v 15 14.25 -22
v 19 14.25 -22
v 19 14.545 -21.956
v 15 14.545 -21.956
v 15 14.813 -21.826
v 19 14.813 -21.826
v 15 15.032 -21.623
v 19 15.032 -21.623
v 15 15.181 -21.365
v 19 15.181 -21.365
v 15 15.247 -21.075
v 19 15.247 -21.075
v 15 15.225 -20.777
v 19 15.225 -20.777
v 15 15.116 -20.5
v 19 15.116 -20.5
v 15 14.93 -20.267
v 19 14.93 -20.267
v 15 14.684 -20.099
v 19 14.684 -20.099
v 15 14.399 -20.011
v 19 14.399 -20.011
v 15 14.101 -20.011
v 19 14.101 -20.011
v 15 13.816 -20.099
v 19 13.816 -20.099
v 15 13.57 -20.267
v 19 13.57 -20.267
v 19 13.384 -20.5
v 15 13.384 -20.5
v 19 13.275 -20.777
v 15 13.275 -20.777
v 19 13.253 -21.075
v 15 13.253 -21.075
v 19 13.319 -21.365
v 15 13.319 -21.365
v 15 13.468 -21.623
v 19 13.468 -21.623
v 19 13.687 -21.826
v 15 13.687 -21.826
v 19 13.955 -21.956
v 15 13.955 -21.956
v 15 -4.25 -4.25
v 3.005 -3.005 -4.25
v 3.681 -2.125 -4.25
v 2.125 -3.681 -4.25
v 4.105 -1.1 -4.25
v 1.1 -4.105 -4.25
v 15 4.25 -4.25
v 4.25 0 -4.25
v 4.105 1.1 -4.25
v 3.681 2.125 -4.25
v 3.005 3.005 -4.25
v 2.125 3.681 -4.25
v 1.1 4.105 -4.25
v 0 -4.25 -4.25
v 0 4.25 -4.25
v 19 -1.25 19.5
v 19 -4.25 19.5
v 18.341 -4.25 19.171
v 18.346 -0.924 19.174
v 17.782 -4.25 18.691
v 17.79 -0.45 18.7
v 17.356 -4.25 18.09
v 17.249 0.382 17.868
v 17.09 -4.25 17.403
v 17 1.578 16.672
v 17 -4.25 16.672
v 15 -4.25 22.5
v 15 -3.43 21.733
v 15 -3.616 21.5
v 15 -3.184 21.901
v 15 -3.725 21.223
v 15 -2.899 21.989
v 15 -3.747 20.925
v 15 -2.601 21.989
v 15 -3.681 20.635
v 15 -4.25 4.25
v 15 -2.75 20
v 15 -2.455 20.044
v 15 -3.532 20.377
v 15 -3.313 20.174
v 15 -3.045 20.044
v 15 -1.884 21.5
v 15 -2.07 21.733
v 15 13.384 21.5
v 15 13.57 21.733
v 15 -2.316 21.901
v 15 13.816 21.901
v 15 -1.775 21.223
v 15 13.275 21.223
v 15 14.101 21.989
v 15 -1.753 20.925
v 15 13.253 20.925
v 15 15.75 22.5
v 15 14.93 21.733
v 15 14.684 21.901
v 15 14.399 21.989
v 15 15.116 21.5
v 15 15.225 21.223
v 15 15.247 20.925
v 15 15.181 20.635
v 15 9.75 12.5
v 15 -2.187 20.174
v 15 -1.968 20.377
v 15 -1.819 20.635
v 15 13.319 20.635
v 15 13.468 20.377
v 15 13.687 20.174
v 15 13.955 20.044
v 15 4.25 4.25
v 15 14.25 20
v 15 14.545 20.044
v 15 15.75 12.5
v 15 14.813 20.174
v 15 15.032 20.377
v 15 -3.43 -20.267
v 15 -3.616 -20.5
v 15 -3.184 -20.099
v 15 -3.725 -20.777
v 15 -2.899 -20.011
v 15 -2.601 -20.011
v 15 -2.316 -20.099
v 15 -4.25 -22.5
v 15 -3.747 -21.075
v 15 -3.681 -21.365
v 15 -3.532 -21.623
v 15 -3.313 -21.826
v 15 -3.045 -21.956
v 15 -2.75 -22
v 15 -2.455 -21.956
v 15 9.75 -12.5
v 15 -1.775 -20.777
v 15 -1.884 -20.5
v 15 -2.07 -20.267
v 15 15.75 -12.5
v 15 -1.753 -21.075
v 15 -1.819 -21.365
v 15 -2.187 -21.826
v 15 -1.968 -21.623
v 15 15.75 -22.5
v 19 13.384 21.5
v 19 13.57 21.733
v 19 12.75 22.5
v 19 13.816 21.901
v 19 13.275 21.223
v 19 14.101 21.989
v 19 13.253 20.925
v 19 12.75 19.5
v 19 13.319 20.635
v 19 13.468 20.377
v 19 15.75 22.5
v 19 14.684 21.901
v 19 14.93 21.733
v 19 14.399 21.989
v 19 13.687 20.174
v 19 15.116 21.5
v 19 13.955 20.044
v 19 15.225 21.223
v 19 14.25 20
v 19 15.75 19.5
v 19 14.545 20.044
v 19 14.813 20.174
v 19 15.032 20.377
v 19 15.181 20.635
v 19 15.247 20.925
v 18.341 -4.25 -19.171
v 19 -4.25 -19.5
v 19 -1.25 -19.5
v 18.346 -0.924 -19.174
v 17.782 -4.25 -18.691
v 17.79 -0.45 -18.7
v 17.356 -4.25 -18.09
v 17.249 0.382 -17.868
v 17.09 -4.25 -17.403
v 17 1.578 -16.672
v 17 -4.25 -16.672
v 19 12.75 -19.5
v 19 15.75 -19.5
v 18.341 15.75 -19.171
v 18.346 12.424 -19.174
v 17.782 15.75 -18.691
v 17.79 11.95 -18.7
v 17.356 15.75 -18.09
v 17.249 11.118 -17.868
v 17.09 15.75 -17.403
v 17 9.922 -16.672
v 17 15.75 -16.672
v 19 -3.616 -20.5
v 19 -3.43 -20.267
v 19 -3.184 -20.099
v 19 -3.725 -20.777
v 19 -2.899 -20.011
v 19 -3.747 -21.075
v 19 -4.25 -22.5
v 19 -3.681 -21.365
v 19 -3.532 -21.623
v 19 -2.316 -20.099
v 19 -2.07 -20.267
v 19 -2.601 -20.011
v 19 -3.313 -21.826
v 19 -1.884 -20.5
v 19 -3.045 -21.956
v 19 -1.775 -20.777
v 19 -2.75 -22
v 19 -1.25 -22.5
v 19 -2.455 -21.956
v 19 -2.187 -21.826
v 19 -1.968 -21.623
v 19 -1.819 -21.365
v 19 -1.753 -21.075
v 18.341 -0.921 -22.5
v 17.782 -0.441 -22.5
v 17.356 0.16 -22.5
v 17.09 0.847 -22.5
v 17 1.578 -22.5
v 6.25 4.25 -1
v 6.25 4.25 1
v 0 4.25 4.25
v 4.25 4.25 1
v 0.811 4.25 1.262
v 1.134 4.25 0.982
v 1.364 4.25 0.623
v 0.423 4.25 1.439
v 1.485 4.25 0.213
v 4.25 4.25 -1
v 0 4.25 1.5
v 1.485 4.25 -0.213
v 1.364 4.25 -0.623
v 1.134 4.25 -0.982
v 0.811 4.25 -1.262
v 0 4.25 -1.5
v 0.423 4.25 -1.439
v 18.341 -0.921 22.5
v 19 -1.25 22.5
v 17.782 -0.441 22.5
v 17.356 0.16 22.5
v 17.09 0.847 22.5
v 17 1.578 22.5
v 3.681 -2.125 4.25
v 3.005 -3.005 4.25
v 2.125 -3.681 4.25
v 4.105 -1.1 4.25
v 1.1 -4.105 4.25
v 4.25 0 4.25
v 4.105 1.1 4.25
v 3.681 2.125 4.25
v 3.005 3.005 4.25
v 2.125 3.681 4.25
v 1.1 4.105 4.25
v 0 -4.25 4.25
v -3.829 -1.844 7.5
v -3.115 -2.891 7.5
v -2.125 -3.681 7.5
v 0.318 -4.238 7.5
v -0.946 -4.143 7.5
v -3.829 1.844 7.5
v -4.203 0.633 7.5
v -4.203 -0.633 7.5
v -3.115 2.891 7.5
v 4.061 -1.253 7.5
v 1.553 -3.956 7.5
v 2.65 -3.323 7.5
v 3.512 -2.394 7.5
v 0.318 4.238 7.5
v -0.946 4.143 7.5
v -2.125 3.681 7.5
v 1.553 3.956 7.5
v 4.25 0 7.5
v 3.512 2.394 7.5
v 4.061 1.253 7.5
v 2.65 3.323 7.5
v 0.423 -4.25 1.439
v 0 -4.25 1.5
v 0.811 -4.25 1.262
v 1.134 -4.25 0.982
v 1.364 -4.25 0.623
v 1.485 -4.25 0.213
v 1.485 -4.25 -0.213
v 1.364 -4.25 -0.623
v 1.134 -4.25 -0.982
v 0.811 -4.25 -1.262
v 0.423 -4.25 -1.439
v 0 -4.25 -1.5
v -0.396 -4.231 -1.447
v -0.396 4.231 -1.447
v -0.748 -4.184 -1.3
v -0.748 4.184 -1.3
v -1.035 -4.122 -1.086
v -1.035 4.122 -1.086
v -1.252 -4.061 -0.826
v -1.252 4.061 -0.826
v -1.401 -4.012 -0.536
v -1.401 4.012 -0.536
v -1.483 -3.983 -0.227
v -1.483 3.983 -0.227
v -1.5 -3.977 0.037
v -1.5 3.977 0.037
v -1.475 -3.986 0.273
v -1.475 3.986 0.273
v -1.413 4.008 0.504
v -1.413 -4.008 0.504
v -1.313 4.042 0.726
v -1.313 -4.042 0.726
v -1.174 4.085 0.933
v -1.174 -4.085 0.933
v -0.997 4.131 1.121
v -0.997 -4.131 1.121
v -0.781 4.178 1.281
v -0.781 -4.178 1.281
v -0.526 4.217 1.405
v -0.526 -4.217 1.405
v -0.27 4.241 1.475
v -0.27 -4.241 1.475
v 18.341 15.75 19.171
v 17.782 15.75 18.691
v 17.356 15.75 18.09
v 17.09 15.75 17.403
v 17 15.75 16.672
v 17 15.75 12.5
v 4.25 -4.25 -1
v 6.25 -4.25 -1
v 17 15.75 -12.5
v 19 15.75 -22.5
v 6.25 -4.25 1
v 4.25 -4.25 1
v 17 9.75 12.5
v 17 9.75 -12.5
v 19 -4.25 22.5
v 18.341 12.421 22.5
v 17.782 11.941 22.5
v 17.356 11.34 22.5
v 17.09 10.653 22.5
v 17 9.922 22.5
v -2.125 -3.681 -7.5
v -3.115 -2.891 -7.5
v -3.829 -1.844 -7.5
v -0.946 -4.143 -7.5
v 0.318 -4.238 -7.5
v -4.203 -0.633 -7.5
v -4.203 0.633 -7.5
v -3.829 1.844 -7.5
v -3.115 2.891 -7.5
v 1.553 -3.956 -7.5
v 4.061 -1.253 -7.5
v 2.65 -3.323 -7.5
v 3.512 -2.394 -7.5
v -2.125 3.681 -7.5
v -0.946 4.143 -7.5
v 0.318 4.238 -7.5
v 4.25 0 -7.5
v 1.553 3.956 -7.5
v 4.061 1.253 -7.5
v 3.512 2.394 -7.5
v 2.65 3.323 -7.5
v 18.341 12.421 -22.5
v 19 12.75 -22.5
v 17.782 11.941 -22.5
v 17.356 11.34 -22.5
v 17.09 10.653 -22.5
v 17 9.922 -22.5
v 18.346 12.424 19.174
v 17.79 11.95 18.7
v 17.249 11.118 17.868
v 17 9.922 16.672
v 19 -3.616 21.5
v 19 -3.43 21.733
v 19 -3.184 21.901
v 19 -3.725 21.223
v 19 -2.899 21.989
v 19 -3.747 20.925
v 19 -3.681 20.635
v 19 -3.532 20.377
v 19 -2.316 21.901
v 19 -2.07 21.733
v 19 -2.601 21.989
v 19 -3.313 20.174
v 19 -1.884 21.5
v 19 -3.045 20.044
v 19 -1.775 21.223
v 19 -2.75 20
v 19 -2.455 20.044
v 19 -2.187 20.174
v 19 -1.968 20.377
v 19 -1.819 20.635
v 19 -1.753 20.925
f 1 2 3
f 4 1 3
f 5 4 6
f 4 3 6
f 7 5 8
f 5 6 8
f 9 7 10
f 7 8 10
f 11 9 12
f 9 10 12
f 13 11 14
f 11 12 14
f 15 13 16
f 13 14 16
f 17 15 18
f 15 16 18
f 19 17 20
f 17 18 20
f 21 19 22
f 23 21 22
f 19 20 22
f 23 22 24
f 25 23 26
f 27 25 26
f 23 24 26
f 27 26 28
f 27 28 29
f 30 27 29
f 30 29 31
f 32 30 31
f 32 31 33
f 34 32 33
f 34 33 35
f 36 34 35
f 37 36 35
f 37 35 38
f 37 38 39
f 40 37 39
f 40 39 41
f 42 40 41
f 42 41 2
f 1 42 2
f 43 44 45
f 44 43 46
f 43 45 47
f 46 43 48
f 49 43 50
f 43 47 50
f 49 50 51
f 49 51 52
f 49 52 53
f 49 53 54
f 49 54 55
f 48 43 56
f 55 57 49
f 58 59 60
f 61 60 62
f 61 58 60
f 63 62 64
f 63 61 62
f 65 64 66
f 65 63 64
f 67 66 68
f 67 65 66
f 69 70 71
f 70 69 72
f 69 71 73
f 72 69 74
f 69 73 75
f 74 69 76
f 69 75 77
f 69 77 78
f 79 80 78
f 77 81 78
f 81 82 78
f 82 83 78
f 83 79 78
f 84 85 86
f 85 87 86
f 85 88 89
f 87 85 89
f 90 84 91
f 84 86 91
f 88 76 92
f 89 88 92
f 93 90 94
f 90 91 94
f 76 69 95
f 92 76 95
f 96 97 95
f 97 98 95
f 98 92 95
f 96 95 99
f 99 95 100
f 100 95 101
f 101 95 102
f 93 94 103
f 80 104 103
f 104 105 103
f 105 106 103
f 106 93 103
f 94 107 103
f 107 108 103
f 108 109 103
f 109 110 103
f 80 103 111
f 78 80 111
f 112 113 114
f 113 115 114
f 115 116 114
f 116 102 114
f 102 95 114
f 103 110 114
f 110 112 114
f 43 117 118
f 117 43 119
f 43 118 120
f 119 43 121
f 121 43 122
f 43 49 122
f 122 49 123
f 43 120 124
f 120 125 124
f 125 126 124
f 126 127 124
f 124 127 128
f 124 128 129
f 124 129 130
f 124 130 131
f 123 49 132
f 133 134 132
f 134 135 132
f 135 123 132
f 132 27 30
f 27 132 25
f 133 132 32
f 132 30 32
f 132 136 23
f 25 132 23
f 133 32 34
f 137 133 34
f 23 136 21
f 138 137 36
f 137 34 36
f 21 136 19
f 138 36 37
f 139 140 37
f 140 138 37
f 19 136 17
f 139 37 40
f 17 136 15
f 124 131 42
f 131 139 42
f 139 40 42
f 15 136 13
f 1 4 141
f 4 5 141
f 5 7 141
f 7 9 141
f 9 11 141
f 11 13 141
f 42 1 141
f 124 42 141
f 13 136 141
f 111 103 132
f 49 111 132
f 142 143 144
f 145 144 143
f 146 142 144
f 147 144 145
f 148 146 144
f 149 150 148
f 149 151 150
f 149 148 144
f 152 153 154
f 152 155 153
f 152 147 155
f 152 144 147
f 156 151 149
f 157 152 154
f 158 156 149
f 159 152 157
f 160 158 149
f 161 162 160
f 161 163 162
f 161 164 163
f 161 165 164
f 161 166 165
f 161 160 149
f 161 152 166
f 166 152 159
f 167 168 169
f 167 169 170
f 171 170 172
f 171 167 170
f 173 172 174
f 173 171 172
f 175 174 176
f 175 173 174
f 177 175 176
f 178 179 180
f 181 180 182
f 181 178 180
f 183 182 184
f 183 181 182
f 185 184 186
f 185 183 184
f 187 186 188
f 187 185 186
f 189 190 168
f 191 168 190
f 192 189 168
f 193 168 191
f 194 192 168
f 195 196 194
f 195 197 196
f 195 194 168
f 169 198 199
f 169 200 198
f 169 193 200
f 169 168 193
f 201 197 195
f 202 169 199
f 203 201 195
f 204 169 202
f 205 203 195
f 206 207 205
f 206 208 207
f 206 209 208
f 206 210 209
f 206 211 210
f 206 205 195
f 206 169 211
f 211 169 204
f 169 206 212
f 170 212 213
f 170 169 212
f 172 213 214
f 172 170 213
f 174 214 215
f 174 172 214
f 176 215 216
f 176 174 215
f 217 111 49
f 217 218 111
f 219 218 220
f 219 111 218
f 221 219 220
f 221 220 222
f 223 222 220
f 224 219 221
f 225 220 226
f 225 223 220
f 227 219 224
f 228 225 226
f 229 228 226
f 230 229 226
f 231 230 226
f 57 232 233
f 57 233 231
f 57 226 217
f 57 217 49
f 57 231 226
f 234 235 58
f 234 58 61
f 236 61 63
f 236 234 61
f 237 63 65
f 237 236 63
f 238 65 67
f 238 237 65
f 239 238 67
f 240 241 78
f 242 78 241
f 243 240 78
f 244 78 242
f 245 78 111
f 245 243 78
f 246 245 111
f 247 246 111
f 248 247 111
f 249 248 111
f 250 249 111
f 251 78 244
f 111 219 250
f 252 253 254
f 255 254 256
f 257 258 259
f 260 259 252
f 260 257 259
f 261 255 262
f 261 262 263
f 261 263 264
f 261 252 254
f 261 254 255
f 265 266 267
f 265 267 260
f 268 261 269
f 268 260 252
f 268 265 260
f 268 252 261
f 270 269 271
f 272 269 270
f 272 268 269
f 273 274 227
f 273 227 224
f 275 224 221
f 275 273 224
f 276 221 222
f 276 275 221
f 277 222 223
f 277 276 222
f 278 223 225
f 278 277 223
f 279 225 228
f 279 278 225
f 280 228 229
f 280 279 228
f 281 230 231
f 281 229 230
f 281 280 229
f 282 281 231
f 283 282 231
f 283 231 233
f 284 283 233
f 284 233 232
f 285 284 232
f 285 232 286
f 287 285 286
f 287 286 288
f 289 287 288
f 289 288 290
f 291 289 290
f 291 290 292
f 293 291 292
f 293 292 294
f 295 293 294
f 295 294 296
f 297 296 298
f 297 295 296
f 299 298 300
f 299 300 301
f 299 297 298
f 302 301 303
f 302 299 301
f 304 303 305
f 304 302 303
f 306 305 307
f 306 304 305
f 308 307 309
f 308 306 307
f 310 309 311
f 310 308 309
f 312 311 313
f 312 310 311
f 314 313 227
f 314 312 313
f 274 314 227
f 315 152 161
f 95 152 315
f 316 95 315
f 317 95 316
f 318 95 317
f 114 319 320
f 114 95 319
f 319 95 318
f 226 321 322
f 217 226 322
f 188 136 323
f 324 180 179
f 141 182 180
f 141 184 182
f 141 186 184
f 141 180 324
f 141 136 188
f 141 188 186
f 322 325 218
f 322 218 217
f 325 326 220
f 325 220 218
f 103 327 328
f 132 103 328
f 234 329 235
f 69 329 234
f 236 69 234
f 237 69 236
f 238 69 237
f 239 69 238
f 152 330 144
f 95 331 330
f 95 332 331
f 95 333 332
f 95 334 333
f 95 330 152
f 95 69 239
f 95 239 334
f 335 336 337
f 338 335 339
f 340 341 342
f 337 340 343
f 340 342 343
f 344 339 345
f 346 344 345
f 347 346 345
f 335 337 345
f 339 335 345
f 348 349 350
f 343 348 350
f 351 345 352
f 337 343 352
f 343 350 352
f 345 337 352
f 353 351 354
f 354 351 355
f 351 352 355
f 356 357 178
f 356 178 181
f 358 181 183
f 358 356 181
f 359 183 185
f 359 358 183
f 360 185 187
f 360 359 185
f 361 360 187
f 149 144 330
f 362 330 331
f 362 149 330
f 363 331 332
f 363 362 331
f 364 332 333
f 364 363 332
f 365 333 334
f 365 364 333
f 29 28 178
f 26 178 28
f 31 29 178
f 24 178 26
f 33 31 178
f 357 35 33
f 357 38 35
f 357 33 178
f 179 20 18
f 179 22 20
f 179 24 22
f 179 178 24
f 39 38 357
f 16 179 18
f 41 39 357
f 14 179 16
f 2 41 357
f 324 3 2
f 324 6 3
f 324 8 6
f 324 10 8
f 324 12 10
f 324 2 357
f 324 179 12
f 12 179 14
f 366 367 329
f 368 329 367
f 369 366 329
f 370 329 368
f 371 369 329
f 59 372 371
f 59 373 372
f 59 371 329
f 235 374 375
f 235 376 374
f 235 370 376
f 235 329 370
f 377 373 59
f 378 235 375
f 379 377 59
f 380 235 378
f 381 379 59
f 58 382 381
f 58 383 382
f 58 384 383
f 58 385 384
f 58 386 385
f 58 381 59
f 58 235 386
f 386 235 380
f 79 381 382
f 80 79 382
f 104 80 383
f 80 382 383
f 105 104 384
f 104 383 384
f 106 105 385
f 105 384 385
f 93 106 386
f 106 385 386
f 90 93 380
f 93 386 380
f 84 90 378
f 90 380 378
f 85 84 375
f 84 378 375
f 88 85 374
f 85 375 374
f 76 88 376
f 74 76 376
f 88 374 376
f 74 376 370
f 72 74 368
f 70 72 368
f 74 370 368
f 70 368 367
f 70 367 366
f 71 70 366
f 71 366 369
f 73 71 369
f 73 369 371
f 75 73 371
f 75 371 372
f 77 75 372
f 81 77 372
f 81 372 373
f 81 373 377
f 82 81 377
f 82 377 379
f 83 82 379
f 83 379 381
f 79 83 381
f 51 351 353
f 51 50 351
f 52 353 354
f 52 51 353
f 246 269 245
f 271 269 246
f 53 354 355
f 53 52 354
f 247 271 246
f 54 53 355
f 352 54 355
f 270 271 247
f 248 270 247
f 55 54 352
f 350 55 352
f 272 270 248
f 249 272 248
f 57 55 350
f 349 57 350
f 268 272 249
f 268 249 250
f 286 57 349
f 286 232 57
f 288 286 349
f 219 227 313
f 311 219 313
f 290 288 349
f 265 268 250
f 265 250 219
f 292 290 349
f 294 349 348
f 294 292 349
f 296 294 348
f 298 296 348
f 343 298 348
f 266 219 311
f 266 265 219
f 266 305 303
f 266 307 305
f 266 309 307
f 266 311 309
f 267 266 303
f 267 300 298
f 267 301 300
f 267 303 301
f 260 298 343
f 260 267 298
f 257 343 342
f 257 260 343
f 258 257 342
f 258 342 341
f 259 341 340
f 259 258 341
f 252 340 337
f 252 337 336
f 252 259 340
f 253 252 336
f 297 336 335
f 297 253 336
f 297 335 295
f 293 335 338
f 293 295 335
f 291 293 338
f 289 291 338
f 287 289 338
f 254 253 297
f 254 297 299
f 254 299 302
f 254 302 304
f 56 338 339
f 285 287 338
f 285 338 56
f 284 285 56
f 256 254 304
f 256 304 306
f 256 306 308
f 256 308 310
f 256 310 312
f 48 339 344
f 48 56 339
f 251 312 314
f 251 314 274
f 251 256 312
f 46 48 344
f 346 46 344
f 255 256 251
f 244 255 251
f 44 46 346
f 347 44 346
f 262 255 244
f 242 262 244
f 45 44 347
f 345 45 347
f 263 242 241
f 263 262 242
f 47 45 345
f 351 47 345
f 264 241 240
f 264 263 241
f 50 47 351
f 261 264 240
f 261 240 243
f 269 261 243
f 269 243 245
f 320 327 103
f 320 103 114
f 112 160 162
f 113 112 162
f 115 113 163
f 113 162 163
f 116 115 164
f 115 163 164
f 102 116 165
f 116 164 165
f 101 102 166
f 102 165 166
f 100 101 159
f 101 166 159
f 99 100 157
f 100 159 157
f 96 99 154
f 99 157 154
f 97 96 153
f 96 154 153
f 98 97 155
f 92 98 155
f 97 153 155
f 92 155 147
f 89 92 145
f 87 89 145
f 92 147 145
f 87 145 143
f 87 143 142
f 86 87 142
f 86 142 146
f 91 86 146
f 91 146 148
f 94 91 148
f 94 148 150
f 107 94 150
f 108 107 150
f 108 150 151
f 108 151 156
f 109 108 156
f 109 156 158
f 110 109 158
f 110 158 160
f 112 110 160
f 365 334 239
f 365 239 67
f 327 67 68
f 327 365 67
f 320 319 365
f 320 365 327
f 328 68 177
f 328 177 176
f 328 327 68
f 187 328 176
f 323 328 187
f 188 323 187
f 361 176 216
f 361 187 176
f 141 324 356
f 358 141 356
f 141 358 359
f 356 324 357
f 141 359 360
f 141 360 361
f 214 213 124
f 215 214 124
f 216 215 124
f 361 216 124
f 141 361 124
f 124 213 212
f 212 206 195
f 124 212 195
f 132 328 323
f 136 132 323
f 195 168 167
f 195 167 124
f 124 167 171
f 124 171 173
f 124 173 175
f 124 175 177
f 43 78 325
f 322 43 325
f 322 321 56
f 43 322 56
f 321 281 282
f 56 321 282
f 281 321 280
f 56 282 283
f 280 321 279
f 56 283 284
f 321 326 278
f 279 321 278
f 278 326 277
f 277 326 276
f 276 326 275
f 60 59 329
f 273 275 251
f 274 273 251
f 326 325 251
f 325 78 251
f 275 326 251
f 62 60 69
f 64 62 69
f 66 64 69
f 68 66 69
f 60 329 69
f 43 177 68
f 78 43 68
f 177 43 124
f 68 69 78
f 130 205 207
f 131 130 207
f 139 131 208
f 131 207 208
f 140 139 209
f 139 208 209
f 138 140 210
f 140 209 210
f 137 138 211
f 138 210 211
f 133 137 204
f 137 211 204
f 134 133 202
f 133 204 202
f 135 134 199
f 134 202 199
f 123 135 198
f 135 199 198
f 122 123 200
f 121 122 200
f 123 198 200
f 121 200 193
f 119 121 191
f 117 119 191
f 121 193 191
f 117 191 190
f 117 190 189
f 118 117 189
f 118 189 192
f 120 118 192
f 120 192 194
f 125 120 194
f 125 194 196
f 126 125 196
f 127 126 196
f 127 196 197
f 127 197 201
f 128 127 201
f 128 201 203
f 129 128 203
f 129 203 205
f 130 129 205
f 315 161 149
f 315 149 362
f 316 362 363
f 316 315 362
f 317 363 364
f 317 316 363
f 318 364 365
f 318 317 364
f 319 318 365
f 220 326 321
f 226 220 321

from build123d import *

# Parameters (mm, degrees)
SKETCH1_R               = 4.25
BOSS_EXTRUDE1_DEPTH     = 7.5
SKETCH2_W               = 8.5
SKETCH2_H               = 8.5
BOSS_EXTRUDE2_DEPTH     = 15
SKETCH3_W               = 45
SKETCH3_H               = 20
BOSS_EXTRUDE3_DEPTH     = 4
SKETCH4_R               = 1
CUT_EXTRUDE1_DEPTH      = 36.984371608
CUT_EXTRUDE2_DEPTH      = 2
SKETCH6_W               = 25
SKETCH6_H               = 6
CUT_EXTRUDE3_DEPTH      = 2
CUT_EXTRUDE4_DEPTH      = 32.614869919
CUT_EXTRUDE4_DEPTH_BACK = 32.614869919
SKETCH7_R               = 1.5
CUT_EXTRUDE5_DEPTH      = 34.396294705
CUT_EXTRUDE5_DEPTH_BACK = 34.396294705
SKETCH8_W               = 2
SKETCH8_H               = 2
FILLET1_R               = 3


with BuildPart() as part:
    # Sketch1 → Boss-Extrude1 (new, symmetric)
    with BuildSketch(Plane.XY):
        Circle(SKETCH1_R)
    extrude(amount=BOSS_EXTRUDE1_DEPTH, both=True)

    # Sketch2 → Boss-Extrude2 (add)
    with BuildSketch(Plane(origin=(0, 0, 0), x_dir=(0, 0, -1), z_dir=(1, 0, 0))):
        Rectangle(SKETCH2_W, SKETCH2_H)
    extrude(amount=BOSS_EXTRUDE2_DEPTH)

    # Sketch3 → Boss-Extrude3 (add)
    with BuildSketch(Plane(origin=(15, 0, 0), x_dir=(0, 0, -1), z_dir=(1, 0, 0))):
        with Locations((0, 5.75)):
            Rectangle(SKETCH3_W, SKETCH3_H)
    extrude(amount=BOSS_EXTRUDE3_DEPTH)

    # Sketch4 → Cut-Extrude1 (cut, through all)
    with BuildSketch(Plane(origin=(19, 0, 0), x_dir=(0, 0, -1), z_dir=(1, 0, 0))):
        with Locations((-21, 14.25)):
            Circle(SKETCH4_R)
        with Locations((-21, -2.75)):
            Circle(SKETCH4_R)
        with Locations((21, -2.75)):
            Circle(SKETCH4_R)
        with Locations((21, 14.25)):
            Circle(SKETCH4_R)
    extrude(amount=-CUT_EXTRUDE1_DEPTH, mode=Mode.SUBTRACT)

    # Sketch5 → Cut-Extrude2 (cut)
    with BuildSketch(Plane(origin=(19, 0, 0), x_dir=(0, 0, -1), z_dir=(1, 0, 0))):
        Polygon((19.5, 15.75), (-19.5, 15.75), (-19.5, 12.75), (-22.5, 12.75), (-22.5, -1.25), (-19.5, -1.25), (-19.5, -4.25), (19.5, -4.25), (19.5, -1.25), (22.5, -1.25), (22.5, 12.75), (19.5, 12.75), align=None)
    extrude(amount=-CUT_EXTRUDE2_DEPTH, mode=Mode.SUBTRACT)

    # Sketch6 → Cut-Extrude3 (cut)
    with BuildSketch(Plane(origin=(17, 0, 0), x_dir=(0, 0, -1), z_dir=(1, 0, 0))):
        with Locations((0, 12.75)):
            Rectangle(SKETCH6_W, SKETCH6_H)
    extrude(amount=-CUT_EXTRUDE3_DEPTH, mode=Mode.SUBTRACT)

    # Sketch7 → Cut-Extrude4 (cut, two sides: drawn at the far end of the back side and taken through both)
    with BuildSketch(Plane(origin=(0, 4.25, 0), x_dir=(1, 0, 0), z_dir=(0, 1, 0)).offset(-CUT_EXTRUDE4_DEPTH_BACK)):
        with Locations(Location((0, 0, 0), (0, 0, 270))):
            Circle(SKETCH7_R)
    extrude(amount=CUT_EXTRUDE4_DEPTH + CUT_EXTRUDE4_DEPTH_BACK, mode=Mode.SUBTRACT)

    # Sketch8 → Cut-Extrude5 (cut, two sides: drawn at the far end of the back side and taken through both)
    with BuildSketch(Plane(origin=(0, 0, 0), x_dir=(1, 0, 0), z_dir=(0, 1, 0)).offset(-CUT_EXTRUDE5_DEPTH_BACK)):
        with Locations((5.25, 0)):
            Rectangle(SKETCH8_W, SKETCH8_H)
    extrude(amount=CUT_EXTRUDE5_DEPTH + CUT_EXTRUDE5_DEPTH_BACK, mode=Mode.SUBTRACT)

    # Fillet1
    # the kernel refuses this fillet: 3 mm, written as the material it adds along each edge
    with BuildSketch(Plane(origin=(17, -1.25, -19.5), x_dir=(0, 1, 0), z_dir=(0, 0, -1)), Plane(origin=(17, -4.25, -19.5), x_dir=(0, 0, 1), z_dir=(0, 1, 0)), Plane(origin=(17, 12.75, -19.5), x_dir=(0, 0, 1), z_dir=(0, 1, 0)), Plane(origin=(17, 12.75, -22.5), x_dir=(0, -1, 0), z_dir=(0, 0, 1)), Plane(origin=(17, -1.25, 22.5), x_dir=(0, 1, 0), z_dir=(0, 0, -1)), Plane(origin=(17, 15.75, 19.5), x_dir=(0, 0, -1), z_dir=(0, -1, 0)), Plane(origin=(17, 12.75, 19.5), x_dir=(0, -1, 0), z_dir=(0, 0, 1))) as fillet1_piece_1:
        with BuildLine():
            CenterArc((2.828427125, 3), FILLET1_R, 199.471220634, 70.528779366)
            Line((0, 2), (-0.056568542, 1.98))
            ThreePointArc((-0.056568542, 1.98), (-0.06, 1), (-0.06, 0))
            Line((-0.06, 0), (0, -0.06))
            Line((0, -0.06), (2.828427125, -0.06))
            Line((2.828427125, -0.06), (2.828427125, 0))
        make_face()
    extrude(amount=3)
    with BuildSketch(Plane(origin=(17, -1.25, 19.5), x_dir=(1, 0, 0), z_dir=(0, -1, 0))) as fillet1_piece_2:
        with BuildLine():
            CenterArc((3, -2.828427125), FILLET1_R, 109.471220634, 70.528779366)
            Line((0, -2.828427125), (-0.06, -2.828427125))
            Line((-0.06, -2.828427125), (-0.06, 0))
            Line((-0.06, 0), (0, 0.06))
            ThreePointArc((0, 0.06), (1, 0.06), (1.98, 0.056568542))
            Line((1.98, 0.056568542), (2, 0))
        make_face()
    extrude(amount=3)
    with BuildSketch(Plane(origin=(17, -1.25, -12.428932188), x_dir=(0, 1, 0), z_dir=(0, 0, -1))) as fillet1_piece_3a_section:
        with BuildLine():
            CenterArc((2.828427125, 3), FILLET1_R, 199.471220634, 70.528779366)
            Line((0, 2), (-0.056568542, 1.98))
            ThreePointArc((-0.056568542, 1.98), (-0.06, 1), (-0.06, 0))
            Line((-0.06, 0), (0, -0.06))
            Line((0, -0.06), (2.828427125, -0.06))
            Line((2.828427125, -0.06), (2.828427125, 0))
        make_face()
    fillet1_piece_3a = extrude(amount=10.071067812, mode=Mode.PRIVATE)
    fillet1_piece_3a = split(fillet1_piece_3a, bisect_by=Plane(origin=(17.51353179, -0.571681569, -19.5), z_dir=(0, 0, 1)), keep=Keep.TOP, mode=Mode.PRIVATE)
    with BuildSketch(Plane(origin=(17, -4.25, -19.5), x_dir=(0, 0, 1), z_dir=(0, 1, 0))) as fillet1_piece_3b_section:
        with BuildLine():
            CenterArc((2.828427125, 3), FILLET1_R, 199.471220634, 70.528779366)
            Line((0, 2), (-0.056568542, 1.98))
            ThreePointArc((-0.056568542, 1.98), (-0.06, 1), (-0.06, 0))
            Line((-0.06, 0), (0, -0.06))
            Line((0, -0.06), (2.828427125, -0.06))
            Line((2.828427125, -0.06), (2.828427125, 0))
        make_face()
    fillet1_piece_3b = extrude(amount=10.071067812, mode=Mode.PRIVATE)
    fillet1_piece_3b = split(fillet1_piece_3b, bisect_by=Plane(origin=(17.51353179, -1.25, -18.821681569), z_dir=(0, 1, 0)), keep=Keep.TOP, mode=Mode.PRIVATE)
    fillet1_piece_3 = fillet1_piece_3a & fillet1_piece_3b
    add(fillet1_piece_3)
    with BuildSketch(Plane(origin=(17, 5.678932188, -19.5), x_dir=(0, 0, 1), z_dir=(0, 1, 0))) as fillet1_piece_4a_section:
        with BuildLine():
            CenterArc((2.828427125, 3), FILLET1_R, 199.471220634, 70.528779366)
            Line((0, 2), (-0.056568542, 1.98))
            ThreePointArc((-0.056568542, 1.98), (-0.06, 1), (-0.06, 0))
            Line((-0.06, 0), (0, -0.06))
            Line((0, -0.06), (2.828427125, -0.06))
            Line((2.828427125, -0.06), (2.828427125, 0))
        make_face()
    fillet1_piece_4a = extrude(amount=10.071067812, mode=Mode.PRIVATE)
    fillet1_piece_4a = split(fillet1_piece_4a, bisect_by=Plane(origin=(17.51353179, 12.75, -18.821681569), z_dir=(0, -1, 0)), keep=Keep.TOP, mode=Mode.PRIVATE)
    with BuildSketch(Plane(origin=(17, 12.75, -22.5), x_dir=(0, -1, 0), z_dir=(0, 0, 1))) as fillet1_piece_4b_section:
        with BuildLine():
            CenterArc((2.828427125, 3), FILLET1_R, 199.471220634, 70.528779366)
            Line((0, 2), (-0.056568542, 1.98))
            ThreePointArc((-0.056568542, 1.98), (-0.06, 1), (-0.06, 0))
            Line((-0.06, 0), (0, -0.06))
            Line((0, -0.06), (2.828427125, -0.06))
            Line((2.828427125, -0.06), (2.828427125, 0))
        make_face()
    fillet1_piece_4b = extrude(amount=10.071067812, mode=Mode.PRIVATE)
    fillet1_piece_4b = split(fillet1_piece_4b, bisect_by=Plane(origin=(17.51353179, 12.071681569, -12.5), z_dir=(0, 0, -1)), keep=Keep.TOP, mode=Mode.PRIVATE)
    fillet1_piece_4b = split(fillet1_piece_4b, bisect_by=Plane(origin=(17.51353179, 12.071681569, -19.5), z_dir=(0, 0, 1)), keep=Keep.TOP, mode=Mode.PRIVATE)
    fillet1_piece_4 = fillet1_piece_4a & fillet1_piece_4b
    add(fillet1_piece_4)
    with BuildSketch(Plane(origin=(17, 5.821067812, 19.5), x_dir=(1, 0, 0), z_dir=(0, -1, 0))) as fillet1_piece_5a_section:
        with BuildLine():
            CenterArc((3, -2.828427125), FILLET1_R, 109.471220634, 70.528779366)
            Line((0, -2.828427125), (-0.06, -2.828427125))
            Line((-0.06, -2.828427125), (-0.06, 0))
            Line((-0.06, 0), (0, 0.06))
            ThreePointArc((0, 0.06), (1, 0.06), (1.98, 0.056568542))
            Line((1.98, 0.056568542), (2, 0))
        make_face()
    fillet1_piece_5a = extrude(amount=10.071067812, mode=Mode.PRIVATE)
    fillet1_piece_5a = split(fillet1_piece_5a, bisect_by=Plane(origin=(17.51353179, -1.25, 18.821681569), z_dir=(0, 1, 0)), keep=Keep.TOP, mode=Mode.PRIVATE)
    with BuildSketch(Plane(origin=(17, -1.25, 22.5), x_dir=(0, 1, 0), z_dir=(0, 0, -1))) as fillet1_piece_5b_section:
        with BuildLine():
            CenterArc((2.828427125, 3), FILLET1_R, 199.471220634, 70.528779366)
            Line((0, 2), (-0.056568542, 1.98))
            ThreePointArc((-0.056568542, 1.98), (-0.06, 1), (-0.06, 0))
            Line((-0.06, 0), (0, -0.06))
            Line((0, -0.06), (2.828427125, -0.06))
            Line((2.828427125, -0.06), (2.828427125, 0))
        make_face()
    fillet1_piece_5b = extrude(amount=10.071067812, mode=Mode.PRIVATE)
    fillet1_piece_5b = split(fillet1_piece_5b, bisect_by=Plane(origin=(17.51353179, -0.571681569, 19.5), z_dir=(0, 0, -1)), keep=Keep.TOP, mode=Mode.PRIVATE)
    fillet1_piece_5 = fillet1_piece_5a & fillet1_piece_5b
    add(fillet1_piece_5)
    with BuildSketch(Plane(origin=(17, 12.75, 12.428932188), x_dir=(0, -1, 0), z_dir=(0, 0, 1))) as fillet1_piece_6a_section:
        with BuildLine():
            CenterArc((2.828427125, 3), FILLET1_R, 199.471220634, 70.528779366)
            Line((0, 2), (-0.056568542, 1.98))
            ThreePointArc((-0.056568542, 1.98), (-0.06, 1), (-0.06, 0))
            Line((-0.06, 0), (0, -0.06))
            Line((0, -0.06), (2.828427125, -0.06))
            Line((2.828427125, -0.06), (2.828427125, 0))
        make_face()
    fillet1_piece_6a = extrude(amount=10.071067812, mode=Mode.PRIVATE)
    fillet1_piece_6a = split(fillet1_piece_6a, bisect_by=Plane(origin=(17.51353179, 12.071681569, 12.5), z_dir=(0, 0, 1)), keep=Keep.TOP, mode=Mode.PRIVATE)
    fillet1_piece_6a = split(fillet1_piece_6a, bisect_by=Plane(origin=(17.51353179, 12.071681569, 19.5), z_dir=(0, 0, -1)), keep=Keep.TOP, mode=Mode.PRIVATE)
    with BuildSketch(Plane(origin=(17, 15.75, 19.5), x_dir=(0, 0, -1), z_dir=(0, -1, 0))) as fillet1_piece_6b_section:
        with BuildLine():
            CenterArc((2.828427125, 3), FILLET1_R, 199.471220634, 70.528779366)
            Line((0, 2), (-0.056568542, 1.98))
            ThreePointArc((-0.056568542, 1.98), (-0.06, 1), (-0.06, 0))
            Line((-0.06, 0), (0, -0.06))
            Line((0, -0.06), (2.828427125, -0.06))
            Line((2.828427125, -0.06), (2.828427125, 0))
        make_face()
    fillet1_piece_6b = extrude(amount=10.071067812, mode=Mode.PRIVATE)
    fillet1_piece_6b = split(fillet1_piece_6b, bisect_by=Plane(origin=(17.51353179, 12.75, 18.821681569), z_dir=(0, -1, 0)), keep=Keep.TOP, mode=Mode.PRIVATE)
    fillet1_piece_6 = fillet1_piece_6a & fillet1_piece_6b
    add(fillet1_piece_6)


solid = part.part
